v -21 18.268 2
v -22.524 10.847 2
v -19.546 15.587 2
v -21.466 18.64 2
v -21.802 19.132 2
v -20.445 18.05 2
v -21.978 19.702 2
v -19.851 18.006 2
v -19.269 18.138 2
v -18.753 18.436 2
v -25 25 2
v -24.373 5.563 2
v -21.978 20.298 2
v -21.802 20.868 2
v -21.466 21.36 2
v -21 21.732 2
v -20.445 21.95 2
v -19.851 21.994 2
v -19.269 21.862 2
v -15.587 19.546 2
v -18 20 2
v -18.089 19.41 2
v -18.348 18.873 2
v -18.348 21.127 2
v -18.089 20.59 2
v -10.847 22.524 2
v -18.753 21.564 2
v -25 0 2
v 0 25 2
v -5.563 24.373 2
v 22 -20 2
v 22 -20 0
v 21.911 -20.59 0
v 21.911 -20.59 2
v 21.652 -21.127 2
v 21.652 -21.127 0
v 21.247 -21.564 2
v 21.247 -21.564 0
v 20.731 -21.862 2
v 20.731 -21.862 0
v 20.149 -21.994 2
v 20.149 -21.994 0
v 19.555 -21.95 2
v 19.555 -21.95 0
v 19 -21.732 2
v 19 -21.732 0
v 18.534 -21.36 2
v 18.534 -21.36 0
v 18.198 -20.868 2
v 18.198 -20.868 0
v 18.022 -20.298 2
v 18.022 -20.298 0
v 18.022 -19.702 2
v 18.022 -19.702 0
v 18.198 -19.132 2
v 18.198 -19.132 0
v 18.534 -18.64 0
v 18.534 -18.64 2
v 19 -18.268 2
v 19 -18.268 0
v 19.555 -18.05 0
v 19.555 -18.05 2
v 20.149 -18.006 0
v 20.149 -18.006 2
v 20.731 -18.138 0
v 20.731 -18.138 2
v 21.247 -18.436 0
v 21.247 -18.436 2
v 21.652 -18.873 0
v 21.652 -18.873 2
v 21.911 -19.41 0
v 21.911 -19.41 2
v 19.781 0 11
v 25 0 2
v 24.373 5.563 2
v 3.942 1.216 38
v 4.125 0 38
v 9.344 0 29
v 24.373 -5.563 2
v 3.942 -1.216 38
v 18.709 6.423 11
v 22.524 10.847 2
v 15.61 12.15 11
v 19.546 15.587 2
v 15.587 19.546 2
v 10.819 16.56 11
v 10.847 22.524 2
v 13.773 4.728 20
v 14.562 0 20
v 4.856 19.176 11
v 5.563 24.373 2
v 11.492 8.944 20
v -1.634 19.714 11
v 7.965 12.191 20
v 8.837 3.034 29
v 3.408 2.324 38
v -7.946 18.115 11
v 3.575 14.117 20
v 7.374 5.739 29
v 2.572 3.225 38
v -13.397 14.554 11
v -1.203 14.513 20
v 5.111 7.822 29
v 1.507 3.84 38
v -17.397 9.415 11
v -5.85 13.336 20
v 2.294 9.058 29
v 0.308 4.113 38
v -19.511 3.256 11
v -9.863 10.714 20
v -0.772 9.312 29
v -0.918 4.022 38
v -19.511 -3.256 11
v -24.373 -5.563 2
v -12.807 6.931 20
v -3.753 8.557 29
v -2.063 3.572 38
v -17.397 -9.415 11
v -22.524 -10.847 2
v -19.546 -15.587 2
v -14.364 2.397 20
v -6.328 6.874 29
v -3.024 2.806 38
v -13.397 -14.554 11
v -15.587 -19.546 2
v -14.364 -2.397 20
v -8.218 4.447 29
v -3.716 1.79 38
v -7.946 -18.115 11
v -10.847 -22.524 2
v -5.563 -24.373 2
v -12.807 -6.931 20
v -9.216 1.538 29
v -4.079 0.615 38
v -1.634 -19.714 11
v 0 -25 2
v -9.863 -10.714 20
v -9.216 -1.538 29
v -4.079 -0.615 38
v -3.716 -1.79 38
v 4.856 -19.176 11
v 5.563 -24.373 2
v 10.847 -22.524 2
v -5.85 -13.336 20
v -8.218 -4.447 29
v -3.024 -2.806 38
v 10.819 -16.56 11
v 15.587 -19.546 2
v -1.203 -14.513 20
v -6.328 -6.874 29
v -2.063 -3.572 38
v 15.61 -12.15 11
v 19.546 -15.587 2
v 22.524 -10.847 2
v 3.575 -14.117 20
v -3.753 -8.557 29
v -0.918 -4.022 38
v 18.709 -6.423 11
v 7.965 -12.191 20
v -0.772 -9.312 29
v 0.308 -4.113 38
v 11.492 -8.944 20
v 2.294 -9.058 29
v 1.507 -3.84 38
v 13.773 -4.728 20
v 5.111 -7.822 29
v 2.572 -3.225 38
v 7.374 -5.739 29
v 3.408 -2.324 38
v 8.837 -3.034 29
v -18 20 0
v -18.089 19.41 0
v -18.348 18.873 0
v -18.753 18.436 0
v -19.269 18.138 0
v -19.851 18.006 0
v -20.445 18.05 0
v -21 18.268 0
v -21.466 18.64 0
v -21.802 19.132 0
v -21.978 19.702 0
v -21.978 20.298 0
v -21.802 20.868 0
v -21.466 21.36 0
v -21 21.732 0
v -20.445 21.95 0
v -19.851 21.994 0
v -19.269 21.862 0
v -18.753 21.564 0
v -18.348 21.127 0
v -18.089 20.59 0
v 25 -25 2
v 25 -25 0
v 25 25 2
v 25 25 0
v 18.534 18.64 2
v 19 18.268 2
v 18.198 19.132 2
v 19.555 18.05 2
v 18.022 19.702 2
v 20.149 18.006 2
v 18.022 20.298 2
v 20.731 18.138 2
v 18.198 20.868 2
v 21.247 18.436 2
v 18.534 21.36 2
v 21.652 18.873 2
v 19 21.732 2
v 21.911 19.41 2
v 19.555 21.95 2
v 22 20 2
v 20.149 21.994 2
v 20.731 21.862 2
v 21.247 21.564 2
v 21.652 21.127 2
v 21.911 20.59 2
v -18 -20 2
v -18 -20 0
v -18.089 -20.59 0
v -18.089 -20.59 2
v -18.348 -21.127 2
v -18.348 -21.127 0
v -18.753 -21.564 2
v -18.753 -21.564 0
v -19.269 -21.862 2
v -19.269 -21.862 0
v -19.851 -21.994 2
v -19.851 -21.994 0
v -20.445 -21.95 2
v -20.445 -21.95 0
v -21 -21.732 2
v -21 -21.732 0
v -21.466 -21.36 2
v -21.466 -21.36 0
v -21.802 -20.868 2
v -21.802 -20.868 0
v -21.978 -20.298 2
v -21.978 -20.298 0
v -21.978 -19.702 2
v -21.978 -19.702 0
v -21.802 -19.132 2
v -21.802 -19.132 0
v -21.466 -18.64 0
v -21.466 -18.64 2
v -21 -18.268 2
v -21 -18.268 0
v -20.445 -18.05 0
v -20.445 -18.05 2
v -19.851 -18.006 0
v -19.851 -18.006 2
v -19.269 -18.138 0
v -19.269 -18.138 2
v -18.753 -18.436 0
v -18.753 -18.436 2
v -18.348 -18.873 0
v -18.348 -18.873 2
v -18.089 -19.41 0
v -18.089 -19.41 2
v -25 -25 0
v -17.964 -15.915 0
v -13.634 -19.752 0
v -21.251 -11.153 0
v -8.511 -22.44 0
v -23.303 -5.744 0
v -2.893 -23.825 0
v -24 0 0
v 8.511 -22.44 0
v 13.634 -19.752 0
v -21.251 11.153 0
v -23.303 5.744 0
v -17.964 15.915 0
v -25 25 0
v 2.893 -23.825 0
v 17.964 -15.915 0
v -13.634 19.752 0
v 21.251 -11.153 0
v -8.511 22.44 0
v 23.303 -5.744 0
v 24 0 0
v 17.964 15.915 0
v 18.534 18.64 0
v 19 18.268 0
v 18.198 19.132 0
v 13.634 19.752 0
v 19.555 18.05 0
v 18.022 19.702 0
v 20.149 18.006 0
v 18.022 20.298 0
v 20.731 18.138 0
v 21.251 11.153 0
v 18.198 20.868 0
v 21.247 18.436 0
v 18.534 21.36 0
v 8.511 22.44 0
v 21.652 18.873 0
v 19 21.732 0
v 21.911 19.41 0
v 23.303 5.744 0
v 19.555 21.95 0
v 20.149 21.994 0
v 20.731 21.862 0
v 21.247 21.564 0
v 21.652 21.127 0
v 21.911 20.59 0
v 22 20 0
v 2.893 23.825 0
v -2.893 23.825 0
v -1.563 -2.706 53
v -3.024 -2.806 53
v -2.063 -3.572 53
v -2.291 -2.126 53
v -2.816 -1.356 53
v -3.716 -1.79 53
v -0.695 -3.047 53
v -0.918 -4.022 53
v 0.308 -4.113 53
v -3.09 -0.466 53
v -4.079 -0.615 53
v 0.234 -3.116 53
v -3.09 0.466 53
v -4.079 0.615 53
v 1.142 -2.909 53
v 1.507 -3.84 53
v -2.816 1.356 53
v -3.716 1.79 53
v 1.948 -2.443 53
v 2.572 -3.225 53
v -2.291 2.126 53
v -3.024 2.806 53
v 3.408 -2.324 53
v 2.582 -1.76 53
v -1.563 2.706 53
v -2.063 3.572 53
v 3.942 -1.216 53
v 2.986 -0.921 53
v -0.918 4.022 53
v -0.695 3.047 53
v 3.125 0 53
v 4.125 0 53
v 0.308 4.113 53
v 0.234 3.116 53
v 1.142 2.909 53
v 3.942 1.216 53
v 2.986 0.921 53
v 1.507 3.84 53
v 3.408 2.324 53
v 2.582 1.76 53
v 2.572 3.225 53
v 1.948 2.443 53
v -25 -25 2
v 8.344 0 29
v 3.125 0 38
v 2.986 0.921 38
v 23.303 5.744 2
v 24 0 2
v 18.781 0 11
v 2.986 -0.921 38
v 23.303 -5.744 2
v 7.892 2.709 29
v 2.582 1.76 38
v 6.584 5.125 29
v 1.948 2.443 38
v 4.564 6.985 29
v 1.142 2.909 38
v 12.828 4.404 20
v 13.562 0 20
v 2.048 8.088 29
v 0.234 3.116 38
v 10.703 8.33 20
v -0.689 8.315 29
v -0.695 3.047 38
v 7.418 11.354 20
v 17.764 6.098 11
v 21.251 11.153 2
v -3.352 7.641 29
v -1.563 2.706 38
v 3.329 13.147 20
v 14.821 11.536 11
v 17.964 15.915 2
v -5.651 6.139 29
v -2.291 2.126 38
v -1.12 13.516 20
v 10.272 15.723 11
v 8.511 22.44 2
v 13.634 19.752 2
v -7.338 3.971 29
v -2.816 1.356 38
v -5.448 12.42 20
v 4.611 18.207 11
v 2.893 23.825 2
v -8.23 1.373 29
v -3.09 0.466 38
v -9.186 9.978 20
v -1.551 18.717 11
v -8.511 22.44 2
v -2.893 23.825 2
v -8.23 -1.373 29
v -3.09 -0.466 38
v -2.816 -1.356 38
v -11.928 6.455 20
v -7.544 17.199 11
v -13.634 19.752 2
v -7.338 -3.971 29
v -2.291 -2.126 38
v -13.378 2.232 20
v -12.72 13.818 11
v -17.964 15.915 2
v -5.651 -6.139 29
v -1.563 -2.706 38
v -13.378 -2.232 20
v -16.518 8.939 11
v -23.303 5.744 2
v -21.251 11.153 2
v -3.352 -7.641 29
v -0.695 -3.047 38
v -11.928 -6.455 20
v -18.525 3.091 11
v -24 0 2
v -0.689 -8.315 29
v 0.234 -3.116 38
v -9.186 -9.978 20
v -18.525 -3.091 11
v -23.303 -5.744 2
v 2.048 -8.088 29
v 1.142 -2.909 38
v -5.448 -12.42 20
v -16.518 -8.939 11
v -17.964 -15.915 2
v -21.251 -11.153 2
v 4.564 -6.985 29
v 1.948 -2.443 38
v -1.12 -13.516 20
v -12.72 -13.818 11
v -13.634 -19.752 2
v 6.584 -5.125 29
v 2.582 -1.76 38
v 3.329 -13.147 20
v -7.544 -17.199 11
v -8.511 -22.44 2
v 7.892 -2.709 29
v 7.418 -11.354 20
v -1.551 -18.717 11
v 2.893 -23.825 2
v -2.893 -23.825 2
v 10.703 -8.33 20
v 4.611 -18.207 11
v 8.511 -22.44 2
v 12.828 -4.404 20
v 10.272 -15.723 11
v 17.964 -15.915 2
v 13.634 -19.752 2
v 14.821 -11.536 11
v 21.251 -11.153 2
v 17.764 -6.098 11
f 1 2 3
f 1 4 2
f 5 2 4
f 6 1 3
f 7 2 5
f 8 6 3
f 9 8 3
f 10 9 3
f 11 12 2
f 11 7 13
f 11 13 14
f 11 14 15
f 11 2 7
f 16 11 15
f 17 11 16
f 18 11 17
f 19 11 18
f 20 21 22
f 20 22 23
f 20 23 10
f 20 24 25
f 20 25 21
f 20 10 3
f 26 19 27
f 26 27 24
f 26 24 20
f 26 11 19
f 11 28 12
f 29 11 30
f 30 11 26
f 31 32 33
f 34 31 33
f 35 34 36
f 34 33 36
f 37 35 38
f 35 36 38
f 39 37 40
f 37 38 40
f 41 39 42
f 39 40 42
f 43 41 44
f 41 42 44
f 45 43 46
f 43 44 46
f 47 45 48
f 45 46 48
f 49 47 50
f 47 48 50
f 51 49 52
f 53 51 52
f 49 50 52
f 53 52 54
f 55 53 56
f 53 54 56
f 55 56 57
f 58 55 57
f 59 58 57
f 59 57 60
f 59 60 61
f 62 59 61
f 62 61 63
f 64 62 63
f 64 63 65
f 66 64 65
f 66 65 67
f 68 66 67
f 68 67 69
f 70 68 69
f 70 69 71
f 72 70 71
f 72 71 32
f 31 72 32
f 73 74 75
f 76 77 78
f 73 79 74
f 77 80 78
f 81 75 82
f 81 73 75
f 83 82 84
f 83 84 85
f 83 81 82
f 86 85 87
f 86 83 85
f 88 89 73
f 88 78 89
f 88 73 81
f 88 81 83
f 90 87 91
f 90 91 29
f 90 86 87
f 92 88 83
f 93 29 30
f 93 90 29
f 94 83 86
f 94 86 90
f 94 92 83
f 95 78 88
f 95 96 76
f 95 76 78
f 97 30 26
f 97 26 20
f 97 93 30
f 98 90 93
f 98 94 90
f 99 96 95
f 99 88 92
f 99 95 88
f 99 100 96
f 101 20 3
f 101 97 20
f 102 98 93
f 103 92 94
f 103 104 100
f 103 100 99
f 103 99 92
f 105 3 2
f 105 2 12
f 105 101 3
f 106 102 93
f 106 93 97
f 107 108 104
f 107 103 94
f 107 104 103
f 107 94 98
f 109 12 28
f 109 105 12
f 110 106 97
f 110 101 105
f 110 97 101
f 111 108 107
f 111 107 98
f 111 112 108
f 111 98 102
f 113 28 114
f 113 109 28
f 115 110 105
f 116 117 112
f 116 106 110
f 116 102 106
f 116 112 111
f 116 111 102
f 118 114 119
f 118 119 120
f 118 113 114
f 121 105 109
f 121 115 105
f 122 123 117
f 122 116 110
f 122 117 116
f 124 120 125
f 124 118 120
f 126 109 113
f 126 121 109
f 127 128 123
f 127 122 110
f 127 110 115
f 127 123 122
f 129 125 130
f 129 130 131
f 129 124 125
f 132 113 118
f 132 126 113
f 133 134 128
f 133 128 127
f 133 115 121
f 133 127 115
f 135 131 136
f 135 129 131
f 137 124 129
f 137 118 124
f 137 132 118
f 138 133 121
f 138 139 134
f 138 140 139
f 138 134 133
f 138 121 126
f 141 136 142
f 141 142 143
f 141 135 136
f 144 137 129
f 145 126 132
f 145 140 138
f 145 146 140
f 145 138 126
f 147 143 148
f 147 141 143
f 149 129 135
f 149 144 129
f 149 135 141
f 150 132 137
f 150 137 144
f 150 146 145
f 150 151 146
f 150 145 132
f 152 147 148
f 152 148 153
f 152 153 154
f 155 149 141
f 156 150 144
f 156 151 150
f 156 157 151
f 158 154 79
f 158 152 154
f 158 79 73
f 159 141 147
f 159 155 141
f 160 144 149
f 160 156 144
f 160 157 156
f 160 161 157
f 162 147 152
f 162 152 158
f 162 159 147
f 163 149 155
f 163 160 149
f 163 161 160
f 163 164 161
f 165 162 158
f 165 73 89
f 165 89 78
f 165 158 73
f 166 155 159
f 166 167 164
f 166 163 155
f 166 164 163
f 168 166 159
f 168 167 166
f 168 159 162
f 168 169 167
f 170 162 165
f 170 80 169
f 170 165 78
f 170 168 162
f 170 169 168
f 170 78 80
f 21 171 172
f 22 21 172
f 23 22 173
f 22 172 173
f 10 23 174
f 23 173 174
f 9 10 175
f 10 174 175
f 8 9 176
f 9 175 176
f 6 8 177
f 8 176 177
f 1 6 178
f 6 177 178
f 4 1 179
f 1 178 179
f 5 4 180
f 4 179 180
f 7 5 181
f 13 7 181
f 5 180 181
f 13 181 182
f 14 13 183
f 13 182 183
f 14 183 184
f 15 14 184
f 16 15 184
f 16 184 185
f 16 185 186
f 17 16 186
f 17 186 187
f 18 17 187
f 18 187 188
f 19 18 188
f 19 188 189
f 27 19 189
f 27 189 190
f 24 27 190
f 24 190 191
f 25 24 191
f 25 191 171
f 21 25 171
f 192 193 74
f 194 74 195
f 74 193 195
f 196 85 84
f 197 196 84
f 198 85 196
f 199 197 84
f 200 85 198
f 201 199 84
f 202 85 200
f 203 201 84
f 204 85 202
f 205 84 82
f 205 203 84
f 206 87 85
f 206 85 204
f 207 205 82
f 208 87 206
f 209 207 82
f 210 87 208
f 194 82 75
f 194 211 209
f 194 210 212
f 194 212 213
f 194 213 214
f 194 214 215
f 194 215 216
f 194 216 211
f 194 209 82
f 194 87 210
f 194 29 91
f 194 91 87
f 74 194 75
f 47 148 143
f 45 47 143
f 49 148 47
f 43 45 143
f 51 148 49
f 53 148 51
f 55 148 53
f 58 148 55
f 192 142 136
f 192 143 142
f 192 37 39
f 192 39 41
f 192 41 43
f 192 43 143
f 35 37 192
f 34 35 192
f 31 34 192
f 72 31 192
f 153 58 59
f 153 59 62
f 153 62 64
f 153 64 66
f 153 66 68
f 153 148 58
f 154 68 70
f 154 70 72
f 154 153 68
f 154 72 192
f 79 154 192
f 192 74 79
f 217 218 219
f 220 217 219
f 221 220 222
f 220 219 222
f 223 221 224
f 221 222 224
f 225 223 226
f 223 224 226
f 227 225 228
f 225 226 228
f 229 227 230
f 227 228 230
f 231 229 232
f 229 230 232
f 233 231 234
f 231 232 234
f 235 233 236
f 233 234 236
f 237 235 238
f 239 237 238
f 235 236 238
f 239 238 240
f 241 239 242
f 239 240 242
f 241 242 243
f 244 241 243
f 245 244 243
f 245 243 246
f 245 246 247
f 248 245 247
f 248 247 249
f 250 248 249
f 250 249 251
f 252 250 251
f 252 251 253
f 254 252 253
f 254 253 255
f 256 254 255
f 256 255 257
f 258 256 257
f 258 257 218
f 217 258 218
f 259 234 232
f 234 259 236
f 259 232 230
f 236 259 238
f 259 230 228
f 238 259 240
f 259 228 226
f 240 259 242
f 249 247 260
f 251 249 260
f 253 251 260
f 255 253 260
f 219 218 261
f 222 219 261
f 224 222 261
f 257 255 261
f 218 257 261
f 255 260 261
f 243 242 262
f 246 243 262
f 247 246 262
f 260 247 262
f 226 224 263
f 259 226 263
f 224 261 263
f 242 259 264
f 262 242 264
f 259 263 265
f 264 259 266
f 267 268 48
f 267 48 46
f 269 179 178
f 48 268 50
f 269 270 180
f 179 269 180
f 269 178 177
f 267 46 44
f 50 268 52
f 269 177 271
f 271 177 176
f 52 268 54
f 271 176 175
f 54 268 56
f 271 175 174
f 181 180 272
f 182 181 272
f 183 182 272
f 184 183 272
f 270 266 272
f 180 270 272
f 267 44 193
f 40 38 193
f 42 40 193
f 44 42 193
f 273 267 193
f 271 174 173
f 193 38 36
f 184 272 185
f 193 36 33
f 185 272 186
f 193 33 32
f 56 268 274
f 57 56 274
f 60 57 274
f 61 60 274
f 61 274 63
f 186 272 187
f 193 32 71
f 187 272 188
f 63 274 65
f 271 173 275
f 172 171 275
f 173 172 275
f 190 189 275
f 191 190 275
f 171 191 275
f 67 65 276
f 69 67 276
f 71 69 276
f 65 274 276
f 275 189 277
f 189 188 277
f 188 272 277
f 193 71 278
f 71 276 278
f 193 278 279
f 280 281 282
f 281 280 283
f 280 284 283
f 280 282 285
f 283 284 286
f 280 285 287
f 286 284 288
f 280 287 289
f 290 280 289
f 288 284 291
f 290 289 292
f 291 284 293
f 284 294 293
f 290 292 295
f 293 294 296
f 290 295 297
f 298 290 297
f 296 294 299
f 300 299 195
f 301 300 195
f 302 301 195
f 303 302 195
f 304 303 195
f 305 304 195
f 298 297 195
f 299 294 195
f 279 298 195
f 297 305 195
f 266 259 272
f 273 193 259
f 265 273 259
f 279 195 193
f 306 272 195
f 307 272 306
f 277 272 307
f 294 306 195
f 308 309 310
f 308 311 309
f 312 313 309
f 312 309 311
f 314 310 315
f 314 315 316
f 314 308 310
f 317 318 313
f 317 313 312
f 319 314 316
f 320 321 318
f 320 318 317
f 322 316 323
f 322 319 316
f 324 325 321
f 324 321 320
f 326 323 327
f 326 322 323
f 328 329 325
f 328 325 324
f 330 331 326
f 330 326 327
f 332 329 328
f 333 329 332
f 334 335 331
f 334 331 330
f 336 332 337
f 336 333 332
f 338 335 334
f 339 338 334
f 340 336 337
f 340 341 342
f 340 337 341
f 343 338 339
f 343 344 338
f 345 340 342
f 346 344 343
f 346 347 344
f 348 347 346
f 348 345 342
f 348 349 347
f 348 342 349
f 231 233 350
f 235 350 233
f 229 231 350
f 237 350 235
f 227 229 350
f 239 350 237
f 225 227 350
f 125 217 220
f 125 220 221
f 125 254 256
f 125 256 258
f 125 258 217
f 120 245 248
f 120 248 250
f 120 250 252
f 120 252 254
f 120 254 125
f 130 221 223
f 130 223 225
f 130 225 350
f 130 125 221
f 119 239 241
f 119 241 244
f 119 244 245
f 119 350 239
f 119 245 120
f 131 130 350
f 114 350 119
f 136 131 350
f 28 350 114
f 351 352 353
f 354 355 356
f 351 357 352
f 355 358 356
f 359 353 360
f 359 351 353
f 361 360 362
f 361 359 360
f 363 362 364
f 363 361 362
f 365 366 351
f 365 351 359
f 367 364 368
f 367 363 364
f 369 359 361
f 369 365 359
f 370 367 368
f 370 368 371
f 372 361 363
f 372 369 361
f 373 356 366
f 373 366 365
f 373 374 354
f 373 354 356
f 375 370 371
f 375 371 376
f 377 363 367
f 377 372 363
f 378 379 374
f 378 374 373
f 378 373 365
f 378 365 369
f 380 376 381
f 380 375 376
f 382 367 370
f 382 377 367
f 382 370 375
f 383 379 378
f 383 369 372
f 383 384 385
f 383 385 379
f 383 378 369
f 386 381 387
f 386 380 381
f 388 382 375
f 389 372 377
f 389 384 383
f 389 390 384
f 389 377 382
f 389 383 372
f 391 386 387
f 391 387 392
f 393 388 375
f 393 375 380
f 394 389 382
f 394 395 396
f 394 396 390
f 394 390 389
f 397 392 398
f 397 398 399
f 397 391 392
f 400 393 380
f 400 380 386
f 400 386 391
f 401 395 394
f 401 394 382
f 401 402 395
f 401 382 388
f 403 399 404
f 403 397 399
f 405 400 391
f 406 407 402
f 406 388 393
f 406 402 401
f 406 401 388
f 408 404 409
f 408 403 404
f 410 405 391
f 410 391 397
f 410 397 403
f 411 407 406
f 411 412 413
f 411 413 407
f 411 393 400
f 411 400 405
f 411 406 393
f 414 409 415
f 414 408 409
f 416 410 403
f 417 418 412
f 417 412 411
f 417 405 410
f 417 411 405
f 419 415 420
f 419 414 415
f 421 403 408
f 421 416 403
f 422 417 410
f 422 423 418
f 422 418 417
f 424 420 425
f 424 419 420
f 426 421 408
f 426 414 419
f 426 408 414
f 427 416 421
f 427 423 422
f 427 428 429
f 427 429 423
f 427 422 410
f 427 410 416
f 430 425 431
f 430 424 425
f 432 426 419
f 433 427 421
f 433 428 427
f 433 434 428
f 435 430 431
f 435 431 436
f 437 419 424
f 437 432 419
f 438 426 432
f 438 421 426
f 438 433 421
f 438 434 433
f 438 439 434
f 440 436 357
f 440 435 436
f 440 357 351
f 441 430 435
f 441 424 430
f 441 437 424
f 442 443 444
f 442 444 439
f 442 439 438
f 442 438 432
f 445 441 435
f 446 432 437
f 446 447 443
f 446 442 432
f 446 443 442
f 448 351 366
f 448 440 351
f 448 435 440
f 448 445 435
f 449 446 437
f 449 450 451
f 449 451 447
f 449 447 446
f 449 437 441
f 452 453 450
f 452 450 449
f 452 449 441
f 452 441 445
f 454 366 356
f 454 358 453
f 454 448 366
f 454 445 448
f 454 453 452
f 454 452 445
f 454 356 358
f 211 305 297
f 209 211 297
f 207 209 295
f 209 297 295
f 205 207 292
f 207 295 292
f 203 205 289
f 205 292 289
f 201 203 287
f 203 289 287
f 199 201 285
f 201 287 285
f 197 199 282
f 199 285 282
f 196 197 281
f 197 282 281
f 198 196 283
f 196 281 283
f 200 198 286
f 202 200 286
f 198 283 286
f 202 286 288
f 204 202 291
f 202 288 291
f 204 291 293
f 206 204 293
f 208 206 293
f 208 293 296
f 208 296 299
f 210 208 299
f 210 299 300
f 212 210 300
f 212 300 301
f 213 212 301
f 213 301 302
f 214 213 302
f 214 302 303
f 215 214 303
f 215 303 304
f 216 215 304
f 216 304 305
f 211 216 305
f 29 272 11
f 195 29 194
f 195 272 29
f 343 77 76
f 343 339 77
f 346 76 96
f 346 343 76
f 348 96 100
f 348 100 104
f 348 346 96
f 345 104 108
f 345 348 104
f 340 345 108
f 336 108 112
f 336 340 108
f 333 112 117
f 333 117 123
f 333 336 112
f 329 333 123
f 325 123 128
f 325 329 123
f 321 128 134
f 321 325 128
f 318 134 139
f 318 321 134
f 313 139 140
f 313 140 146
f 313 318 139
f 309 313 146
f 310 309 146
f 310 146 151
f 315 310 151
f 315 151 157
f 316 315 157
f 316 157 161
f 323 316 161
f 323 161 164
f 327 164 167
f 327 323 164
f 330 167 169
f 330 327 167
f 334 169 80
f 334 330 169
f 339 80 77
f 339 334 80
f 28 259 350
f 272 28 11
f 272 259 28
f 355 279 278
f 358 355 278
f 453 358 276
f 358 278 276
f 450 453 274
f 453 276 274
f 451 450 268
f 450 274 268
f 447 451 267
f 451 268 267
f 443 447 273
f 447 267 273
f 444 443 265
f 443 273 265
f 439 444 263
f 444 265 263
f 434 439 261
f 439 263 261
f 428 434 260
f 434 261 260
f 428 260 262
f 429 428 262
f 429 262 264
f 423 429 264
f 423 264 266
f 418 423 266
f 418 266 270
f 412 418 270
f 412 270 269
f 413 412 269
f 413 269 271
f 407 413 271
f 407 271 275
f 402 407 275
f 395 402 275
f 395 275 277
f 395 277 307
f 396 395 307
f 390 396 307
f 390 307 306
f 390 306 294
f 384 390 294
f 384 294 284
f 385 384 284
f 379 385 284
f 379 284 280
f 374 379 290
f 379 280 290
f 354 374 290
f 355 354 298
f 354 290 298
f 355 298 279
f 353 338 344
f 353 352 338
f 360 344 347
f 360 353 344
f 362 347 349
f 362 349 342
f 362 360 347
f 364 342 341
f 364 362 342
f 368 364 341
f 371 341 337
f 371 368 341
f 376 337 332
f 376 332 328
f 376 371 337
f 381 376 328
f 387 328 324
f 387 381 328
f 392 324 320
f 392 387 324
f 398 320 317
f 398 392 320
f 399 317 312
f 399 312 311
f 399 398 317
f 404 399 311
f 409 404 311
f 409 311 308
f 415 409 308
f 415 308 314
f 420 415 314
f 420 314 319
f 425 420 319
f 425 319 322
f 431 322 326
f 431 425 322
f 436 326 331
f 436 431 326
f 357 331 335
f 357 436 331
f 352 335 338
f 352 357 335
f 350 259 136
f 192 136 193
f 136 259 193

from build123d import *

# Parameters (mm, degrees)
F0_W     = 50
F0_H     = 50
F1_DEPTH = 2
F2_R     = 24
F3_DEPTH = 25
F5_R     = 2
F6_DEPTH = 2.001


with BuildPart() as f1:
    # F0 (on Top) → F1 (new body)
    with BuildSketch(Plane.XY):
        Rectangle(F0_W, F0_H)
    extrude(amount=F1_DEPTH)

    # F2 (on face) → F3 (cut)
    with BuildSketch(Plane(origin=(0, 0, 0), x_dir=(1, 0, 0), z_dir=(0, 0, -1))):
        Circle(F2_R)
    extrude(amount=-F3_DEPTH, mode=Mode.SUBTRACT)

    # F5 (on face) → F6 (cut, through all)
    with BuildSketch(Plane(origin=(0, 0, 0), x_dir=(1, 0, 0), z_dir=(0, 0, -1))):
        with Locations((-20, 20)):
            Circle(F5_R)
        with Locations((20, 20)):
            Circle(F5_R)
        with Locations((20, -20)):
            Circle(F5_R)
        with Locations((-20, -20)):
            Circle(F5_R)
    extrude(amount=-F6_DEPTH, mode=Mode.SUBTRACT)

    # F4 (on Front) → F7 (revolve)
    with BuildSketch(Plane.XZ):
        Polygon((3.125, 38), (24, 2), (25, 2), (4.125, 38), (4.125, 53), (3.125, 53), align=None)
    revolve(axis=Axis((0, 0, 20), (0, 0, 1)))


solid = f1.part
